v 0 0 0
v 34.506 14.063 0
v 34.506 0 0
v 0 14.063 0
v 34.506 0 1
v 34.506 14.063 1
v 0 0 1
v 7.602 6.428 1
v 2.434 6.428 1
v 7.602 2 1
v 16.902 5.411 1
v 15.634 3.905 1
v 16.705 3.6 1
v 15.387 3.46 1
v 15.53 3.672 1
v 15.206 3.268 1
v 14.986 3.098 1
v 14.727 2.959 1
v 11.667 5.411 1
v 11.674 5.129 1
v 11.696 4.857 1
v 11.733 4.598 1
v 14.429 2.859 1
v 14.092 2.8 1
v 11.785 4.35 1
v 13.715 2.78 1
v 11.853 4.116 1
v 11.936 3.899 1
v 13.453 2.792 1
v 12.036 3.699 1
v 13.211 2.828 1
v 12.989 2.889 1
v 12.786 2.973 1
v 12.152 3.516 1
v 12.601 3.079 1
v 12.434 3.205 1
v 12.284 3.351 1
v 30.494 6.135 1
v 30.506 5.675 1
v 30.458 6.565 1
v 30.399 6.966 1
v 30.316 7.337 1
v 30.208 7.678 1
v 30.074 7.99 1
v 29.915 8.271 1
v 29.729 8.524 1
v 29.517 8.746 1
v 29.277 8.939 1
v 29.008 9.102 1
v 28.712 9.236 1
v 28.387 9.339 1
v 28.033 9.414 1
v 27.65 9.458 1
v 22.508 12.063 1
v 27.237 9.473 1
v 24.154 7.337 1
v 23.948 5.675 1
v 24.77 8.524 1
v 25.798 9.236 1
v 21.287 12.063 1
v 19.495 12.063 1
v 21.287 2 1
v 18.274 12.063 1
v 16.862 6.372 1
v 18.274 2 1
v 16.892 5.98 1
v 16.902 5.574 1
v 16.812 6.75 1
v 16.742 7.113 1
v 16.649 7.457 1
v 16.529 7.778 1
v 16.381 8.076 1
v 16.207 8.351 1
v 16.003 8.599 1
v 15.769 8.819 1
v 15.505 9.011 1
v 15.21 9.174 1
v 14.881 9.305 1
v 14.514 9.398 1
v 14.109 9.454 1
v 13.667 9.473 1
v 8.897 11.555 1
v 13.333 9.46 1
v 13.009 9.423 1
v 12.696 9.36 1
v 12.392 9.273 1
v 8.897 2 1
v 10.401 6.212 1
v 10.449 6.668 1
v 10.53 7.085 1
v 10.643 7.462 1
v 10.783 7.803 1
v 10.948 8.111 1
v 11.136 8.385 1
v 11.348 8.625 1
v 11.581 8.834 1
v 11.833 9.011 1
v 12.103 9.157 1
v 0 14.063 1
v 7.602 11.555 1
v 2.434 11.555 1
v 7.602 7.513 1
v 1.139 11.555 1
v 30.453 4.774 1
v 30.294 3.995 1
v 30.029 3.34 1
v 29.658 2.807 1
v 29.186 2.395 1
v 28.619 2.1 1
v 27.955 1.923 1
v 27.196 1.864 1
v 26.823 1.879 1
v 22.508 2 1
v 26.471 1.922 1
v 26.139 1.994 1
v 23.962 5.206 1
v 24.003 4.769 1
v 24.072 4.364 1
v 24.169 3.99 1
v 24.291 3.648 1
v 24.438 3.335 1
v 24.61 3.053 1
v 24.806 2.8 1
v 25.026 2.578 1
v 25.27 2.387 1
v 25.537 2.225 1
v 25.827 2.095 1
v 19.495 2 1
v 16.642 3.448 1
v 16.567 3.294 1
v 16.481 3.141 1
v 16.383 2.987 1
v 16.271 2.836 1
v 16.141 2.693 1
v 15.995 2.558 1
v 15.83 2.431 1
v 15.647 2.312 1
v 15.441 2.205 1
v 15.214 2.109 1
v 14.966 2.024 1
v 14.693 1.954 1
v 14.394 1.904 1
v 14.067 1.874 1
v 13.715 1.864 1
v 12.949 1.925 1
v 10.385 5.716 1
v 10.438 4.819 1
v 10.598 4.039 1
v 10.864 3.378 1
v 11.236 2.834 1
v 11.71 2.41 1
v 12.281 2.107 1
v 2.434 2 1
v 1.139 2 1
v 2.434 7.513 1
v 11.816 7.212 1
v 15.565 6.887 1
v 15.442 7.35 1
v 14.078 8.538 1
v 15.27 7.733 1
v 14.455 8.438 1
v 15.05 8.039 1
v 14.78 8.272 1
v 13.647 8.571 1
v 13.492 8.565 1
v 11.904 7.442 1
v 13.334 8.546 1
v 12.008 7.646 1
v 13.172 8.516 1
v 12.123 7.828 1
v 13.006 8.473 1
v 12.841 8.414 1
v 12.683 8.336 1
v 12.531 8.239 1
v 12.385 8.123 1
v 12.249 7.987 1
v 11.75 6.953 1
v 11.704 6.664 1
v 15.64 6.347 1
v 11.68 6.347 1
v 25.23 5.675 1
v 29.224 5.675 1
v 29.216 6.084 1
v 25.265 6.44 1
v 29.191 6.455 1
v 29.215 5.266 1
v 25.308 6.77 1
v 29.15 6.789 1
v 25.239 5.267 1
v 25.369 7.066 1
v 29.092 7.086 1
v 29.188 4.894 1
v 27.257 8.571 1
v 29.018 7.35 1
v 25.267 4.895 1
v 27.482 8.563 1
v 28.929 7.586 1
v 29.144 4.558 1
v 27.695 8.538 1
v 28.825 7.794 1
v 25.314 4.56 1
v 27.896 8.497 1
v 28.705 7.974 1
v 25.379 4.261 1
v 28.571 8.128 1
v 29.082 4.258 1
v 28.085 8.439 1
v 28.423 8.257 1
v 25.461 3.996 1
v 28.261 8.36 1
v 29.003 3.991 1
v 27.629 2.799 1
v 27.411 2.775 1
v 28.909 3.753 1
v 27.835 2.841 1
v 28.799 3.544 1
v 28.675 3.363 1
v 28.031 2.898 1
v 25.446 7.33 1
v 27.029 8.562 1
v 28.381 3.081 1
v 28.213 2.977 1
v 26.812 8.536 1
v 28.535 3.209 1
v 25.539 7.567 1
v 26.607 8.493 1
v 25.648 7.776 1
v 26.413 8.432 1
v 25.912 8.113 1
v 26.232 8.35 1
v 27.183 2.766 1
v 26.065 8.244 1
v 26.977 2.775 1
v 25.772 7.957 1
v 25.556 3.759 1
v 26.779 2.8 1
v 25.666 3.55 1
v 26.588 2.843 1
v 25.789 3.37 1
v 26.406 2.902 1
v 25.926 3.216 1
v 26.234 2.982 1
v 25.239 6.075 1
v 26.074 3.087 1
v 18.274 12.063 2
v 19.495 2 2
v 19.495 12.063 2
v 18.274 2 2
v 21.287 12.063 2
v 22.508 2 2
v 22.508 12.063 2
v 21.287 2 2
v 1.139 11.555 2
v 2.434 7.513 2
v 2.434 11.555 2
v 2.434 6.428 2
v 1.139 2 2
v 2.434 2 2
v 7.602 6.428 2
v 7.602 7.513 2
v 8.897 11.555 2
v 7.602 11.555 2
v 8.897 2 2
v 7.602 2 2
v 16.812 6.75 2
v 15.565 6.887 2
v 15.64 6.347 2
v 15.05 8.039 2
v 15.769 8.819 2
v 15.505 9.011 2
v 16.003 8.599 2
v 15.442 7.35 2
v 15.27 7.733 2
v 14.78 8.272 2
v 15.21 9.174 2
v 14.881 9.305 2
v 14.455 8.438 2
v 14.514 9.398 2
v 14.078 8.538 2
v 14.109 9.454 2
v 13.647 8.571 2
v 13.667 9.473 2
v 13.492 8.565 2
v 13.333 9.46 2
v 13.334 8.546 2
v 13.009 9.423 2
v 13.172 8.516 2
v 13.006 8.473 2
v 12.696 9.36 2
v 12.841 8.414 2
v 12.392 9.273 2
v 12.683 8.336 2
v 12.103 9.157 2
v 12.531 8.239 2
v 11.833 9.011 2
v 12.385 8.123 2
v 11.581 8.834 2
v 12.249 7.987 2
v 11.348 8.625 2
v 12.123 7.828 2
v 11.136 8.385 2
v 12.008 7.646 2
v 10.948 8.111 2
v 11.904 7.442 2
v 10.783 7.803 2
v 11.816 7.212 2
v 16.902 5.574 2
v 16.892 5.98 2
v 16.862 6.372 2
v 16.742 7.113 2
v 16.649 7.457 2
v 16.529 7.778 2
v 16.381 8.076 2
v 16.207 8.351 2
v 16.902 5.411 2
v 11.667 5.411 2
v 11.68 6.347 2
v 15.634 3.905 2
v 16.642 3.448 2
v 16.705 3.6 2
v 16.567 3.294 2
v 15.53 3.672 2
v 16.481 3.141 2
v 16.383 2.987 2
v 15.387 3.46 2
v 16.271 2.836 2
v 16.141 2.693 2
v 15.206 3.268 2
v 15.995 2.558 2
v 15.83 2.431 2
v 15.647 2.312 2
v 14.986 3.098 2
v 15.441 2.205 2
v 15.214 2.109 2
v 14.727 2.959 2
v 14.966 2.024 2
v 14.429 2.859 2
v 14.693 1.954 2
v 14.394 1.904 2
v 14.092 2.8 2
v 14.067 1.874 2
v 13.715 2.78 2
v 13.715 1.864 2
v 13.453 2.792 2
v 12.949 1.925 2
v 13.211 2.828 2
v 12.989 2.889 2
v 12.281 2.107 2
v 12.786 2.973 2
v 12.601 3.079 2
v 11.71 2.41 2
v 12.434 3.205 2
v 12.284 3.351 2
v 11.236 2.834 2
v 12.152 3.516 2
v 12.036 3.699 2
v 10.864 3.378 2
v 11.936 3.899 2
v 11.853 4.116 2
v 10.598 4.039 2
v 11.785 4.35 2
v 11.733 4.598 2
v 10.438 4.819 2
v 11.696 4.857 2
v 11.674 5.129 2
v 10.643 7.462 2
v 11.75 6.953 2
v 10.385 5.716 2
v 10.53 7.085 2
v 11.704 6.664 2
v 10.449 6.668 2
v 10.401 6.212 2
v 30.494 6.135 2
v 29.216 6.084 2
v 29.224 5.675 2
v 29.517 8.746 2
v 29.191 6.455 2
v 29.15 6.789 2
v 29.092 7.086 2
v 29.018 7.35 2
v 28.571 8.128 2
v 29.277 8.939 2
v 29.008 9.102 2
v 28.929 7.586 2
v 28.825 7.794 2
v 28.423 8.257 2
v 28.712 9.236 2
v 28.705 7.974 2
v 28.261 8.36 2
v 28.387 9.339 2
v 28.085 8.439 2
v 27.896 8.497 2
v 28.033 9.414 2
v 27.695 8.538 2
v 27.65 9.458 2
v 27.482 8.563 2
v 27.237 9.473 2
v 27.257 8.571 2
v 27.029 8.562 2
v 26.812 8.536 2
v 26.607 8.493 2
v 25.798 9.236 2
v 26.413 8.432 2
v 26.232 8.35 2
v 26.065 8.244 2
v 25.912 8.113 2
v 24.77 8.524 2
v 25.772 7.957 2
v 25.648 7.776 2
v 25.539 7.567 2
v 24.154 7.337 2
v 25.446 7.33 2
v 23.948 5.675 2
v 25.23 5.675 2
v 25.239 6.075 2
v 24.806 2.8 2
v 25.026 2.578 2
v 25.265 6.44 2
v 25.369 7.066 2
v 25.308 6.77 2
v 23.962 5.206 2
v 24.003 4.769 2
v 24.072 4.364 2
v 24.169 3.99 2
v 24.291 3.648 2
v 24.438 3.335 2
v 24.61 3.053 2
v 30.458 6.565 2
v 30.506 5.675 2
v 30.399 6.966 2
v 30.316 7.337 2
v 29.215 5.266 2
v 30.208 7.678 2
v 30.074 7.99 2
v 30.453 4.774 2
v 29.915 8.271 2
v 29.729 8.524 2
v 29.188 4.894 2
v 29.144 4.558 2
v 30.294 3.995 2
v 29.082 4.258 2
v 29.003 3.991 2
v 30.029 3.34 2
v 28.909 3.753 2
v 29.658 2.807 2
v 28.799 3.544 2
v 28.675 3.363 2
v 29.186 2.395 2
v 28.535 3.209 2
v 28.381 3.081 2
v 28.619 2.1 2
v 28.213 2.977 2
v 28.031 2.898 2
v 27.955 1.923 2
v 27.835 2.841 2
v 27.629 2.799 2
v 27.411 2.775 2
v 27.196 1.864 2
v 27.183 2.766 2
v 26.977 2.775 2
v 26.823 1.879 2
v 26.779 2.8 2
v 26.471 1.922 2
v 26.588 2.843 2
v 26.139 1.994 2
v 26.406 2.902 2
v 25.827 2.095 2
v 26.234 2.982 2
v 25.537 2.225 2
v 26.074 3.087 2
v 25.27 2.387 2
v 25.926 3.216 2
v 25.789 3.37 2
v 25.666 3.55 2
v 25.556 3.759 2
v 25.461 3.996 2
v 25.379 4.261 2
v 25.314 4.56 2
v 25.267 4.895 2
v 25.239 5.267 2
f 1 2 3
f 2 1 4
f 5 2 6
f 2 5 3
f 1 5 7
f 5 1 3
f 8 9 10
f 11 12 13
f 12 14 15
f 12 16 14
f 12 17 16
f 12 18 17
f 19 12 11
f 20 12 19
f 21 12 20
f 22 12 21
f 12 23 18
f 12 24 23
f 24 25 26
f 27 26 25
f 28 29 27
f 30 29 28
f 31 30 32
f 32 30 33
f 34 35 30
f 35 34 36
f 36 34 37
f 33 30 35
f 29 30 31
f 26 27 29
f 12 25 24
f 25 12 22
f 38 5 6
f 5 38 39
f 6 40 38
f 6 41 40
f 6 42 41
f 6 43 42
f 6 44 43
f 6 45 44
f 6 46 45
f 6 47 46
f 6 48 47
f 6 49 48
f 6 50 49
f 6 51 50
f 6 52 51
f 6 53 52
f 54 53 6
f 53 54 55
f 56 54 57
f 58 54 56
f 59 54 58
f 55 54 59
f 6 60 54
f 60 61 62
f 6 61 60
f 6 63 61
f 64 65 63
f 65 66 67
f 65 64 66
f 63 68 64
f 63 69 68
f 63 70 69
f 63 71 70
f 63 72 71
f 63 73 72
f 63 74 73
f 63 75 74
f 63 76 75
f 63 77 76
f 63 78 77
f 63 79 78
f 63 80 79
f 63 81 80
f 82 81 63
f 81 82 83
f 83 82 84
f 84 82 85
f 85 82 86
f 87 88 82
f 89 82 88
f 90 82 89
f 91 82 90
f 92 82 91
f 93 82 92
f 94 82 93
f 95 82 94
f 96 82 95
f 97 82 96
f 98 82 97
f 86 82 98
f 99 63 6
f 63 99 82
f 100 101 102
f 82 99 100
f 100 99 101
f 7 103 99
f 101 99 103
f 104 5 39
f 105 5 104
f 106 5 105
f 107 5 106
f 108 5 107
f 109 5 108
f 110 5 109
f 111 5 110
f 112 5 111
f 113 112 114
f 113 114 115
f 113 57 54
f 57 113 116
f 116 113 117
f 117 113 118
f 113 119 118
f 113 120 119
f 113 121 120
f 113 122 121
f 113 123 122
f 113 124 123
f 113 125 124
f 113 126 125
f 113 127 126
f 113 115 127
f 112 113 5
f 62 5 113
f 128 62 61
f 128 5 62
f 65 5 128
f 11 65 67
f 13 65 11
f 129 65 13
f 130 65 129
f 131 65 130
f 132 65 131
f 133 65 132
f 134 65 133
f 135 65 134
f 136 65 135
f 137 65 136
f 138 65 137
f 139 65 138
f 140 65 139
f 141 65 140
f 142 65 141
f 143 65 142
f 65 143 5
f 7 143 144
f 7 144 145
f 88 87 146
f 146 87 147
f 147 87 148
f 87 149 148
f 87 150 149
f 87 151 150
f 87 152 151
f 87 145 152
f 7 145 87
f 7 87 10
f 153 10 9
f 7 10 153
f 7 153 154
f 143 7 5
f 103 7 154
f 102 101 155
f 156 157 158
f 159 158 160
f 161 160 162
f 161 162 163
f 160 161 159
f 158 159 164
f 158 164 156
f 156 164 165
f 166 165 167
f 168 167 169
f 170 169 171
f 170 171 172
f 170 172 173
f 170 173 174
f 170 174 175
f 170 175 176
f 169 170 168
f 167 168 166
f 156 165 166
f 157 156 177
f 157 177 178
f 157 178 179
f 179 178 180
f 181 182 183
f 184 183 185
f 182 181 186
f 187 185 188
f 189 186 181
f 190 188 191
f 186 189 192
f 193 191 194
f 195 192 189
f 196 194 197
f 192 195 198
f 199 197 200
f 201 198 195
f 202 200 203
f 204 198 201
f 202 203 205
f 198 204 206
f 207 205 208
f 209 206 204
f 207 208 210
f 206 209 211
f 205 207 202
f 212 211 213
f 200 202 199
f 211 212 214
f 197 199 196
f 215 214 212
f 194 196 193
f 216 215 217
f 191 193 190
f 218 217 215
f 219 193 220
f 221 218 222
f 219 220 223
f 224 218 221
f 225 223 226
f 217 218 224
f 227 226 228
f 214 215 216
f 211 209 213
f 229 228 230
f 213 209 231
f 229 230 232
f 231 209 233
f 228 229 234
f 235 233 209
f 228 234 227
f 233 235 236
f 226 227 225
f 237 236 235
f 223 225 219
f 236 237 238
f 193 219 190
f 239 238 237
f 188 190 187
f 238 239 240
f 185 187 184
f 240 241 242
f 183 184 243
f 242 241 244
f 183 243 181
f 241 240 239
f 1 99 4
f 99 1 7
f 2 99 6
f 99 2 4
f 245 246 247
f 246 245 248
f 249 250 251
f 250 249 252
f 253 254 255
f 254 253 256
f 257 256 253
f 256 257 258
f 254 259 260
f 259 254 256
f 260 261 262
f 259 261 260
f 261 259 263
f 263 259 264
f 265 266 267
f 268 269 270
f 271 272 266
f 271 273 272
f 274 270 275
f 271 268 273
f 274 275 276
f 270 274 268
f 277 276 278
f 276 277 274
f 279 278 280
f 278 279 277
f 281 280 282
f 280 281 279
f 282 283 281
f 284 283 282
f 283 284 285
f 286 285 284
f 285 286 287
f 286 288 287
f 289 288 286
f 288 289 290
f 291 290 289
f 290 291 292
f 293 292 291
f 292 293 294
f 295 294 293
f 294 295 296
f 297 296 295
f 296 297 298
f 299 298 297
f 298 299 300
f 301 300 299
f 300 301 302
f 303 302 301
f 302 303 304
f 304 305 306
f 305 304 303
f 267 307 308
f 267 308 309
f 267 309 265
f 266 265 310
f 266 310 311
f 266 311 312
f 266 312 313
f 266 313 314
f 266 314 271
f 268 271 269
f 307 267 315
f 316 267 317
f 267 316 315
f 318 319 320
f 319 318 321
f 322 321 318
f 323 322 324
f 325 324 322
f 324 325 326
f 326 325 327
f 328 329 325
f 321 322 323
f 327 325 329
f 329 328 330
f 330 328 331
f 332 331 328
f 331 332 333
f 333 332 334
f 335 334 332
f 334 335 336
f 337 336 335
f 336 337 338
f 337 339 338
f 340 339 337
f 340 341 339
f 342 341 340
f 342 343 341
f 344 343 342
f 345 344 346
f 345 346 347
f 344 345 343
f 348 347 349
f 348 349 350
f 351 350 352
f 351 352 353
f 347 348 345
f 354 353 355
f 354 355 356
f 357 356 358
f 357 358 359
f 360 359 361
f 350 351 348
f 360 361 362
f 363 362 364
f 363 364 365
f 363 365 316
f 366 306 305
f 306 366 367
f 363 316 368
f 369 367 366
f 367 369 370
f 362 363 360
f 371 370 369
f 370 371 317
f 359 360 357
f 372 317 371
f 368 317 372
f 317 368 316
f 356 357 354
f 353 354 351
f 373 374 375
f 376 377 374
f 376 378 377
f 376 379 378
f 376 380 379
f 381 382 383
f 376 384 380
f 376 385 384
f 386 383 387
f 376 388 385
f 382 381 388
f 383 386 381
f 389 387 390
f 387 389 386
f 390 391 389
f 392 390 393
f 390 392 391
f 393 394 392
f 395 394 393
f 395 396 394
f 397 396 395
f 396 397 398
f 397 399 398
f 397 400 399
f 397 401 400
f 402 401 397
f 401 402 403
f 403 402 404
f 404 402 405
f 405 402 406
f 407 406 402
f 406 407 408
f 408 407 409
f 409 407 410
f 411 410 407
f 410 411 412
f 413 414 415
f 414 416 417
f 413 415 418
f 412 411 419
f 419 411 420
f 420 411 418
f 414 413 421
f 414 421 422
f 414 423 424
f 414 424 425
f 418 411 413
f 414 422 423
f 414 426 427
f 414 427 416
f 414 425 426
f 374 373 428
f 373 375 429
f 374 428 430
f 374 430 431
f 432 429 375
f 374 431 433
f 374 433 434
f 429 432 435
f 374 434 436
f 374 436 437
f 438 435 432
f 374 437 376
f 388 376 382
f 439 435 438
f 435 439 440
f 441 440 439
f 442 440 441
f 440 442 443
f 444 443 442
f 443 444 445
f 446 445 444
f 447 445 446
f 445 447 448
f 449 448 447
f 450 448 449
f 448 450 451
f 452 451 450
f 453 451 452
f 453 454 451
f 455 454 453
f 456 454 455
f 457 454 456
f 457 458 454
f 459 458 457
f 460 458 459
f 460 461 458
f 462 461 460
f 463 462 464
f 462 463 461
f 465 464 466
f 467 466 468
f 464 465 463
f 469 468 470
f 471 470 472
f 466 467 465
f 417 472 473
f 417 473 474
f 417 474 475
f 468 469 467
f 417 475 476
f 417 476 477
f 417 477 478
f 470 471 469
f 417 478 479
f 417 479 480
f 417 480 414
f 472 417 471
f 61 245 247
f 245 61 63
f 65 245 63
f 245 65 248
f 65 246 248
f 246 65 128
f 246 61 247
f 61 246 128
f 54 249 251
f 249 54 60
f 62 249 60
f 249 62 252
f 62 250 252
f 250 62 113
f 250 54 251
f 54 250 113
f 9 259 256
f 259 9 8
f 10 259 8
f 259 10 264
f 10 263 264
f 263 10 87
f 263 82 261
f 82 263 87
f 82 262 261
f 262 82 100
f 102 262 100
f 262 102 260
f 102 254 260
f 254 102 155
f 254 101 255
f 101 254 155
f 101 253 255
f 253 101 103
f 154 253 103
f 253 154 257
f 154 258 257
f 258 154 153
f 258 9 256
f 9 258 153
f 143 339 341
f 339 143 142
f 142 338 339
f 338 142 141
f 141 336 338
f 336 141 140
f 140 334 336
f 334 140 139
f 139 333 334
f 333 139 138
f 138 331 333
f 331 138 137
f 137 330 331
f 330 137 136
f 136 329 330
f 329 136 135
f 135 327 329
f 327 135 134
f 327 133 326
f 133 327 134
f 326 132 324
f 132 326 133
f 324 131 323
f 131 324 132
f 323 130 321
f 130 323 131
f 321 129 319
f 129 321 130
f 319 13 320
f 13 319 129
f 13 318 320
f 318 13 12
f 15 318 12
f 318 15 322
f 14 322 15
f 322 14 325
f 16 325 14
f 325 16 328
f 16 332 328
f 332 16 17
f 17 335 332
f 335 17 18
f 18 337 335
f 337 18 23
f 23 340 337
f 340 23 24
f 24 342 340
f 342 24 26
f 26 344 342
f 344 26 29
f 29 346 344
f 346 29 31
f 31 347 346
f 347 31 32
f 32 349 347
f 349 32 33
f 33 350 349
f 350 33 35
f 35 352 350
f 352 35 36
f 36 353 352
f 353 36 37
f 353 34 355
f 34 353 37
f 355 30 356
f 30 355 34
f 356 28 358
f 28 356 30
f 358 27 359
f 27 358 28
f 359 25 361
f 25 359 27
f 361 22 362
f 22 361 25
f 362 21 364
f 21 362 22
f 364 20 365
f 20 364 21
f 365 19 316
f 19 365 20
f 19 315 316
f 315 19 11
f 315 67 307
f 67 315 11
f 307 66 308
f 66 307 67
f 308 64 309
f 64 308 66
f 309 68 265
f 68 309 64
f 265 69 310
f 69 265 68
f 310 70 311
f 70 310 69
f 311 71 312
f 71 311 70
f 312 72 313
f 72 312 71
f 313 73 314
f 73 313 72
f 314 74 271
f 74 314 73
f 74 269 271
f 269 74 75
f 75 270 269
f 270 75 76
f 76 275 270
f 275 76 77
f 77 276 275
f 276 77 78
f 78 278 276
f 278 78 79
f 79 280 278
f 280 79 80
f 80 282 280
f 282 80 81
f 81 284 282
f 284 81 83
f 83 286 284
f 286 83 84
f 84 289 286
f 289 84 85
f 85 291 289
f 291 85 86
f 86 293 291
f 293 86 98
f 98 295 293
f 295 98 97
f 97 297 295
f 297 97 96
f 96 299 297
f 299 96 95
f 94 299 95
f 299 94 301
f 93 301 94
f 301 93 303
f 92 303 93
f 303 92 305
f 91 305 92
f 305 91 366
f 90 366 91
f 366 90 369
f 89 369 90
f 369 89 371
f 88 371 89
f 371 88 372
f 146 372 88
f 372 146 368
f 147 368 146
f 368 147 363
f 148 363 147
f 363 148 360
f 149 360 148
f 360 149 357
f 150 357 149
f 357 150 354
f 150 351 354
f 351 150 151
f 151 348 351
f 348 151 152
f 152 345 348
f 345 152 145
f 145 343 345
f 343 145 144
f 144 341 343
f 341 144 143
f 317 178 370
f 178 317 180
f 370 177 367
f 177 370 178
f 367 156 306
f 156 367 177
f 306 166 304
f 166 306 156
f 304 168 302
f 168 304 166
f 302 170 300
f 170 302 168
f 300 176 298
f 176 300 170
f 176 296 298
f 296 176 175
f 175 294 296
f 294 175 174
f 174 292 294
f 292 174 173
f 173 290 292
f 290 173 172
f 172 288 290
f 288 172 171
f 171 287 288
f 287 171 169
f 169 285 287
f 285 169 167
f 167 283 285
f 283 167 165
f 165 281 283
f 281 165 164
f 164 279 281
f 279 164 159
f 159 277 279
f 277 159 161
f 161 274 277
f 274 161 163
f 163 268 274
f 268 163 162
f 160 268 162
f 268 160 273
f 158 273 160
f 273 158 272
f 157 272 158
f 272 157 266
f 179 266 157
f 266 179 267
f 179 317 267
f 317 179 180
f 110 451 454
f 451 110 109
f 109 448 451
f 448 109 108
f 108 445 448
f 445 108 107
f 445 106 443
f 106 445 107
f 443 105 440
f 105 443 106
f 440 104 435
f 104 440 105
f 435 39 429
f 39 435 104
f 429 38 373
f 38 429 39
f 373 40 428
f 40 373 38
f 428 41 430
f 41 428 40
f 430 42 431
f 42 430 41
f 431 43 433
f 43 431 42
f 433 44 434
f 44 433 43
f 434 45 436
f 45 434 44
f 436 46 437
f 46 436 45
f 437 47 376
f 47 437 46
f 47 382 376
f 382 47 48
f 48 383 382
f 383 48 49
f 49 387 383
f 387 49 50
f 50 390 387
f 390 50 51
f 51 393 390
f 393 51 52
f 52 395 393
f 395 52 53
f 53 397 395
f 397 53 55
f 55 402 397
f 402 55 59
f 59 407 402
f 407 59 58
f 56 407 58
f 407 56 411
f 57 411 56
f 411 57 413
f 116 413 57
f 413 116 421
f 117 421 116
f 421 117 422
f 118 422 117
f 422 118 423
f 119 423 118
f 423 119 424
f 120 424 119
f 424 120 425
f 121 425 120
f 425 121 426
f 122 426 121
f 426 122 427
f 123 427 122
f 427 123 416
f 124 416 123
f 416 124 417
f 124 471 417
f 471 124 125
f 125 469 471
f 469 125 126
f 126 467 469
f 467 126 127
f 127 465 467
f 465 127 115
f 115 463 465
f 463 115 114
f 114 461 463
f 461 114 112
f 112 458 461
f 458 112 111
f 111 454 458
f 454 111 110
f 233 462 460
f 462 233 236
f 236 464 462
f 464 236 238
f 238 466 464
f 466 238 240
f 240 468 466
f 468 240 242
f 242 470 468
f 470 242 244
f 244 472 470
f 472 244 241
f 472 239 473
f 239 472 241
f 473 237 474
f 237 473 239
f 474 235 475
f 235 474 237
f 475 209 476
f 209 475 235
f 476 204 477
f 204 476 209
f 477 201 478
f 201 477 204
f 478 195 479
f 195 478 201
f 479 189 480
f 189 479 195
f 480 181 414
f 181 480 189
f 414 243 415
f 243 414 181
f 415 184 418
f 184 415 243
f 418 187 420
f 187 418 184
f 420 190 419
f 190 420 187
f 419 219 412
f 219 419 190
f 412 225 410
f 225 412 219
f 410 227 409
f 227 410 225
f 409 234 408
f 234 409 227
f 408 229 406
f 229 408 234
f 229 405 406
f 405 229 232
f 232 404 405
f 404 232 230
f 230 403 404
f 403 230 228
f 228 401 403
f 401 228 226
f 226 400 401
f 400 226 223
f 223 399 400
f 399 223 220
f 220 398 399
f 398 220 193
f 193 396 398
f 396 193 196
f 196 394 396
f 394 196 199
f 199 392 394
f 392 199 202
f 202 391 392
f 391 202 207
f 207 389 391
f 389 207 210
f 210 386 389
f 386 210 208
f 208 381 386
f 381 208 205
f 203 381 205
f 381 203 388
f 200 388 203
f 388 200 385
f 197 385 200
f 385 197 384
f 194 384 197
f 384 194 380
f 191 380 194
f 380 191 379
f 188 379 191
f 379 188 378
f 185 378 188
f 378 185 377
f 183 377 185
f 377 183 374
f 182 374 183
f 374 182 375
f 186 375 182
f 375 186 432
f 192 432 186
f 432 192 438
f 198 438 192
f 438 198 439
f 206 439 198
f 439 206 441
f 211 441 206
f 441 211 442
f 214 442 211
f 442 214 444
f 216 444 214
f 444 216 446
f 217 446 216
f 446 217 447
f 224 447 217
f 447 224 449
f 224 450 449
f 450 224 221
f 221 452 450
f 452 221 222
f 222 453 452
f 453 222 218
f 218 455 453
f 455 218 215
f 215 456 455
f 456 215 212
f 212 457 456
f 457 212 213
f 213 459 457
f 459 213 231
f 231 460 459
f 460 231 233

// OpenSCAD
// LibFile: unfy_lists.scad
//   UnfyOpenSCADLib Copyright Leif Burrow 2026
//   kc8rwr@unfy.us
//   unforgettability.net
//   .
//   This file is part of UnfyOpenSCADLib.
//   .
//   unfy_lists.scad contains functions for working with lists and strings within OpenSCAD.

part = "Demo"; //["Demo", "None"]

// Function: unf_lookup
// Synopsis: Lookup with interpolation
// Description: (key, vector[key, value]) - Looks up a value from a table, like the built-in lookup function but interpolate even beyond the bounds of the vector
// Usage: lookup(key, values)
// Arguments:
//   key = the lookup key
//   values = the value table to look within
function unf_lookup(key, values) = 0 == len(values) ? undef : (
  1 == len(values) ? values[0][1] : (
    key < values[0][0] ? values[0][1]-(((values[1][1]-values[0][1])/(values[1][0]-values[0][0])*(values[0][0]-key))) : (
      key <= values[len(values)-1][0] ? lookup(key, values) : (
	values[len(values)-1][1]+((((values[len(values)-1][0]-values[len(values)-2][0])/(values[len(values)-1][1]-values[len(values)-2][1]))*(key-values[len(values)-1][0])))
      )
    )
  )
);

// Function: unf_stCutAfter
// Synopsis: Return a string with everything after the beginning of the first occurance of a substring cut off.
// Description: Find the first occurrance of cutoff within in and return a string that consists of in, only up to that point with the rest cut off.
// Usage: unf_stCutAfter(string in, string cutoff)
// Arguments:
//   in = the input string
//   cutoff = the search substring
//   trim = also trim any preceding or trailing whitespace?
function unf_stCutAfter(in, cutoff, trim=true) = trim ? unf_stTrim(unf_stCutAfter(in, cutoff, false)) : (
  let(vpos=search(cutoff, in), pos=(0==len(vpos)?-1:vpos.x)) 0 > pos ? in : unf_sub(in, 0, pos)
);

// Function: unf_stTrim
// Synopsis: Trim a string
// Description: Return a copy of a string with any whitespace on the front or back trimmed off.
// Usage: unf_strTrim(in)
// Arguments:
//   in = the input string
function unf_stTrim(in) = let(last=len(in)-1)
  0>last ? "" : (
    " "==in[0] || "\r"==in[0] || "\n"==in[0] ? unf_stTrim(unf_sub(in, 1)) : (
      " "==in[last] || "\r"==in[last] || "\n"==in[last] ? unf_stTrim(unf_sub(in, 0, last)) : in
    )
  );

// Function: unf_vToS
// Synopsis: Convert a vector to a string
// Description: Convert a vector to a string.
// Usage: unf_vToS(in)
// Arguments:
//   in = input vector
function unf_vToS(in, pref="", start=0) =
  start >= len(in) ? pref : unf_vToS(in, str(in=pref, pref=in[start]), start=start+1);

// Function: unf_stToLower
// Synopsis: Convert a string to lowercase.
// Description: Take an input string and return a copy where every uppercase character has been converted to it's lowercase equivalent.
// Usage: unf_stToLower(in)
// Arguments:
//   in = the input string
function unf_stToLower(in, pref="", start=0) =
  start >= len(in) ? pref : unf_stToLower(in, str(in=pref, pref=unf_chToLower(in[start])), start=start+1);
  
// Function: unf_stToUpper
// Synopsis: Convert a string to uppercase.
// Description: Take an input string and return a copy where every lowercase character has been converted to it's uppercase equivalent.
// Usage: unf_stToUpper(in)
// Arguments:
//   in = the input string
function unf_stToUpper(in, pref="", start=0) =
  start >= len(in) ? pref : unf_stToUpper(in, str(in=pref, pref=unf_chToUpper(in[start])), start=start+1);

// Function: unf_chToLower
// Synopsis: Convert a character to lowercase
// Description: Accepts a single character and if it is uppercase then return it's lowercase equivalent otherwise return the original input.
// Usage: unf_chToLower(in)
// Arguments:
//   in = the input character
function unf_chToLower(in) = chr(unf_ordToLower(ord(in)));

// Function: unf_chToUpper
// Synopsis: Convert a character to uppercase
// Description: Accepts a single character and if it is lowercase then return it's uppercase equivalent otherwise return the original input.
// Usage: unf_chToUpper(in)
// Arguments:
//   in = the input character
function unf_chToUpper(in) = chr(unf_ordToUpper(ord(in)));

// Function: unf_sub
// Synopsis: return a subset of a string or a vector
// Usage:
//   unf_sub(v, start, count, outv)
// Description:
//   Takes a string or vector input. Returns a string or vector starting at an index and ending no more than count beyond this index. Returns a string or vector type output the same as the input unless outv is set true. In that case then always output a vector.
// Arguments:
//   v = input string or vector value
//   start = starting index
//   count = count of max caracters or items to return
//   outv = force output type to vector?
function unf_sub(v, start=0, count=0, outv=false) =
  (!outv) && is_string(v) ? unf_vToS(unf_sub(v, start, count, true)) : (
    0 == count ? [for(i=[start:len(v)-1])v[i]] : (
      0 < count ? [for(i = [start : min(len(v)-1, start+count-1)]) v[i]] : (
	[for(i = [max(0, start+count+1) : start]) v[i]]
      )
    )
  );

// Function: unf_stToInt
// Synopsis: convert a numeric string to an integer
// Description:
//   Converts a numeric string to an integer. Garbage in = Garbage Out. Non-numeric characters are counted as 0s. Uses recursion, not tail recursive so could overflow but.. that would require a very long number string.
// Usage:
//   unf_stToInt(in)
// Arguments: in = input string
function unf_stToInt(in) = "" == in ? 0 : (
  1 == len(in) ? (
    "0" > in[0] || "9" < in[0] ? 0 : ord(in[0]) - ord("0")
  ) : (
    unf_stToInt(in[len(in)-1]) + (10 * unf_stToInt(unf_sub(in, 0, len(in)-1)))
  )
);

// Function: unf_stToDec
// Synopsis: convert a numeric string to an number's decimal part
// Description:
//   Converts a numeric string to an integer less than 1. Convert it as though there was a "0." in front of it. For example, "123" becomes the number 0.123.  Garbage in = Garbage Out. Non-numeric characters are counted as 0s. Uses recursion, not tail recursive so could overflow but.. that would require a very long number string.
// Usage:
//   unf_stToDec(in)
// Arguments: in = input string
function unf_stToDec(in) = "" == in ? 0 : (
  1 == len(in) ? (
    "0" > in[0] || "9" < in[0] ? 0 : (ord(in[0]) - ord("0")) / 10
  ) : (
    unf_stToDec(in[0]) + (unf_stToDec(unf_sub(in, 1))/10)
  )
);

// Function: unf_stToNum
// Synopsis: convert a numeric string to a number
// Description:
//   Converts a numeric string to a number. Handles integers and floats with decimal points. Interprets a '/' as division, converting fractions to decimals. Garbage in = Garbage Out. Non-numeric characters are counted as 0s. Uses recursion, not tail recursive so could overflow but.. that would require a very long number string.
// Usage:
//   unf_stToNum(in)
// Arguments: in = input string
function unf_stToNum(in) = "" == in ? 0 : (
  is_undef(search("/", in).x) ? (
    is_undef(search(".", in).x) ? unf_stToInt(in) : (
      ("." == in[0] ? 0 : unf_stToInt(unf_sub(in, 0, search(".", in).x)))
      +
      ("." == in[(len(in)-1)] ? 0 : unf_stToDec(unf_sub(in, search(".", in).x+1)))
    )
  ) : (
      ("/" == in[0] ? 0 : unf_stToNum(unf_sub(in, 0, search("/", in).x)))
      /
      ("/" == in[(len(in)-1)] ? 1 : unf_stToNum(unf_sub(in, search("/", in).x+1)))
  )
);

// Function: unf_ordToLower
// Synopsis: Convert a character represented as a unicode number to lowercase
// Description: Converts a number representing a unicode character to the number representing it's lowercase version
// Usage: unf_ordToLower(in)
// Arguments:
//   in = the input number
function unf_ordToLower(in) = in < 65 ? in : (in < 91 ? in+32 : (in < 192 ? in : (in < 215 ? in+32 : (in < 216 ? in : (in < 223 ? in+32 : (in < 256 ? in : (in < 304 ? in : (in < 305 ? in-199 : (in < 306 ? in : (in < 313 ? in : (in < 330 ? in : (in < 376 ? in : (in < 377 ? in-121 : (in < 378 ? (0 == ((in-377)%2) ? in+1 : in) : (in < 385 ? in : (in < 386 ? in+210 : (in < 387 ? (0 == ((in-386)%2) ? in+1 : in) : (in < 390 ? in : (in < 391 ? in+206 : (in < 392 ? (0 == ((in-391)%2) ? in+1 : in) : (in < 393 ? in : (in < 395 ? in+205 : (in < 396 ? (0 == ((in-395)%2) ? in+1 : in) : (in < 398 ? in : (in < 399 ? in+79 : (in < 400 ? in+202 : (in < 401 ? in+203 : (in < 402 ? (0 == ((in-401)%2) ? in+1 : in) : (in < 403 ? in : (in < 404 ? in+205 : (in < 405 ? in+207 : (in < 406 ? in : (in < 407 ? in+211 : (in < 408 ? in+209 : (in < 409 ? (0 == ((in-408)%2) ? in+1 : in) : (in < 412 ? in : (in < 413 ? in+211 : (in < 414 ? in+213 : (in < 415 ? in : (in < 416 ? in+214 : (in < 417 ? (0 == ((in-416)%2) ? in+1 : in) : (in < 422 ? in : (in < 423 ? in+218 : (in < 424 ? (0 == ((in-423)%2) ? in+1 : in) : (in < 425 ? in : (in < 426 ? in+218 : (in < 428 ? in : (in < 430 ? in : (in < 431 ? in+218 : (in < 432 ? (0 == ((in-431)%2) ? in+1 : in) : (in < 433 ? in : (in < 435 ? in+217 : (in < 436 ? (0 == ((in-435)%2) ? in+1 : in) : (in < 439 ? in : (in < 440 ? in+219 : (in < 441 ? (0 == ((in-440)%2) ? in+1 : in) : (in < 444 ? in : (in < 452 ? in : (in < 453 ? in+2 : (in < 454 ? (0 == ((in-453)%2) ? in+1 : in) : (in < 455 ? in : (in < 456 ? in+2 : (in < 457 ? (0 == ((in-456)%2) ? in+1 : in) : (in < 458 ? in : (in < 459 ? in+2 : (in < 460 ? (0 == ((in-459)%2) ? in+1 : in) : (in < 478 ? in : (in < 497 ? in : (in < 498 ? in+2 : (in < 499 ? (0 == ((in-498)%2) ? in+1 : in) : (in < 502 ? in : (in < 503 ? in-97 : (in < 504 ? in-56 : (in < 505 ? (0 == ((in-504)%2) ? in+1 : in) : (in < 544 ? in : (in < 545 ? in-130 : (in < 546 ? in : (in < 570 ? in : (in < 571 ? in+10795 : (in < 572 ? (0 == ((in-571)%2) ? in+1 : in) : (in < 573 ? in : (in < 574 ? in-163 : (in < 575 ? in+10792 : (in < 577 ? in : (in < 579 ? in : (in < 580 ? in-195 : (in < 581 ? in+69 : (in < 582 ? in+71 : (in < 583 ? (0 == ((in-582)%2) ? in+1 : in) : (in < 880 ? in : (in < 886 ? in : (in < 895 ? in : (in < 896 ? in+116 : (in < 902 ? in : (in < 903 ? in+38 : (in < 904 ? in : (in < 907 ? in+37 : (in < 908 ? in : (in < 909 ? in+64 : (in < 910 ? in : (in < 912 ? in+63 : (in < 913 ? in : (in < 930 ? in+32 : (in < 931 ? in : (in < 940 ? in+32 : (in < 975 ? in : (in < 976 ? in+8 : (in < 984 ? in : (in < 1012 ? in : (in < 1013 ? in-60 : (in < 1015 ? in : (in < 1017 ? in : (in < 1018 ? in-7 : (in < 1019 ? (0 == ((in-1018)%2) ? in+1 : in) : (in < 1021 ? in : (in < 1024 ? in-130 : (in < 1040 ? in+80 : (in < 1072 ? in+32 : (in < 1120 ? in : (in < 1162 ? in : (in < 1216 ? in : (in < 1217 ? in+15 : (in < 1218 ? (0 == ((in-1217)%2) ? in+1 : in) : (in < 1232 ? in : (in < 1329 ? in : (in < 1367 ? in+48 : (in < 4256 ? in : (in < 4294 ? in+7264 : (in < 4295 ? in : (in < 4296 ? in+7264 : (in < 4301 ? in : (in < 4302 ? in+7264 : (in < 5024 ? in : (in < 5104 ? in+38864 : (in < 5110 ? in+8 : (in < 7312 ? in : (in < 7355 ? in-3008 : (in < 7357 ? in : (in < 7360 ? in-3008 : (in < 7680 ? in : (in < 7838 ? in : (in < 7839 ? in-7615 : (in < 7840 ? in : (in < 7944 ? in : (in < 7952 ? in-8 : (in < 7960 ? in : (in < 7966 ? in-8 : (in < 7976 ? in : (in < 7984 ? in-8 : (in < 7992 ? in : (in < 8000 ? in-8 : (in < 8008 ? in : (in < 8014 ? in-8 : (in < 8025 ? in : (in < 8026 ? in-8 : (in < 8027 ? in : (in < 8028 ? in-8 : (in < 8029 ? in : (in < 8030 ? in-8 : (in < 8031 ? in : (in < 8032 ? in-8 : (in < 8040 ? in : (in < 8048 ? in-8 : (in < 8072 ? in : (in < 8080 ? in-8 : (in < 8088 ? in : (in < 8096 ? in-8 : (in < 8104 ? in : (in < 8112 ? in-8 : (in < 8120 ? in : (in < 8122 ? in-8 : (in < 8124 ? in-74 : (in < 8125 ? in-9 : (in < 8136 ? in : (in < 8140 ? in-86 : (in < 8141 ? in-9 : (in < 8152 ? in : (in < 8154 ? in-8 : (in < 8156 ? in-100 : (in < 8168 ? in : (in < 8170 ? in-8 : (in < 8172 ? in-112 : (in < 8173 ? in-7 : (in < 8184 ? in : (in < 8186 ? in-128 : (in < 8188 ? in-126 : (in < 8189 ? in-9 : (in < 8486 ? in : (in < 8487 ? in-7517 : (in < 8490 ? in : (in < 8491 ? in-8383 : (in < 8492 ? in-8262 : (in < 8498 ? in : (in < 8499 ? in+28 : (in < 8544 ? in : (in < 8560 ? in+16 : (in < 8579 ? in : (in < 9398 ? in : (in < 9424 ? in+26 : (in < 11264 ? in : (in < 11311 ? in+48 : (in < 11360 ? in : (in < 11362 ? in : (in < 11363 ? in-10743 : (in < 11364 ? in-3814 : (in < 11365 ? in-10727 : (in < 11367 ? in : (in < 11373 ? in : (in < 11374 ? in-10780 : (in < 11375 ? in-10749 : (in < 11376 ? in-10783 : (in < 11377 ? in-10782 : (in < 11378 ? in : (in < 11381 ? in : (in < 11390 ? in : (in < 11392 ? in-10815 : (in < 11393 ? (0 == ((in-11392)%2) ? in+1 : in) : (in < 11499 ? in : (in < 11506 ? in : (in < 42560 ? in : (in < 42624 ? in : (in < 42786 ? in : (in < 42802 ? in : (in < 42873 ? in : (in < 42877 ? in : (in < 42878 ? in-35332 : (in < 42879 ? (0 == ((in-42878)%2) ? in+1 : in) : (in < 42891 ? in : (in < 42893 ? in : (in < 42894 ? in-42280 : (in < 42896 ? in : (in < 42902 ? in : (in < 42922 ? in : (in < 42923 ? in-42308 : (in < 42924 ? in-42319 : (in < 42925 ? in-42315 : (in < 42926 ? in-42305 : (in < 42927 ? in-42308 : (in < 42928 ? in : (in < 42929 ? in-42258 : (in < 42930 ? in-42282 : (in < 42931 ? in-42261 : (in < 42932 ? in+928 : (in < 42933 ? (0 == ((in-42932)%2) ? in+1 : in) : (in < 42946 ? in : (in < 42948 ? in : (in < 42949 ? in-48 : (in < 42950 ? in-42307 : (in < 42951 ? in-35384 : (in < 42952 ? (0 == ((in-42951)%2) ? in+1 : in) : (in < 42997 ? in : (in < 65313 ? in : (in < 65339 ? in+32 : (in < 66560 ? in : (in < 66600 ? in+40 : (in < 66736 ? in : (in < 66772 ? in+40 : (in < 68736 ? in : (in < 68787 ? in+64 : (in < 71840 ? in : (in < 71872 ? in+32 : (in < 93760 ? in : (in < 93792 ? in+32 : (in < 125184 ? in : (in < 125218 ? in+34 : (in))))))))))))))))))))))))))))))))))))))))))))))))))))))))))))))))))))))))))))))))))))))))))))))))))))))))))))))))))))))))))))))))))))))))))))))))))))))))))))))))))))))))))))))))))))))))))))))))))))))))))))))))))))))))))))))))))))))))))))))))))))))))))))))))))))))))));

// Function: unf_ordToUpper
// Synopsis: Convert a character represented as a unicode number to uppercase
// Description: Converts a number representing a unicode character to the number representing it's uppercase version
// Usage: unf_ordToLower(in)
// Arguments:
//   in = the input number
function unf_ordToUpper(in) = in < 97 ? in : (in < 123 ? in-32 : (in < 181 ? in : (in < 182 ? in+743 : (in < 223 ? in : (in < 224 ? in-140 : (in < 247 ? in-32 : (in < 248 ? in : (in < 255 ? in-32 : (in < 256 ? in+121 : (in < 257 ? in : (in < 305 ? in : (in < 306 ? in-232 : (in < 307 ? in : (in < 314 ? in : (in < 329 ? (0 == ((in-314)%2) ? in-1 : in) : (in < 330 ? in+371 : (in < 331 ? in : (in < 378 ? in : (in < 383 ? (0 == ((in-378)%2) ? in-1 : in) : (in < 384 ? in-300 : (in < 385 ? in+195 : (in < 387 ? in : (in < 392 ? in : (in < 396 ? in : (in < 402 ? in : (in < 405 ? in : (in < 406 ? in+97 : (in < 409 ? in : (in < 410 ? (0 == ((in-409)%2) ? in-1 : in) : (in < 411 ? in+163 : (in < 414 ? in : (in < 415 ? in+130 : (in < 417 ? in : (in < 424 ? in : (in < 429 ? in : (in < 432 ? in : (in < 436 ? in : (in < 441 ? in : (in < 445 ? in : (in < 447 ? in : (in < 448 ? in+56 : (in < 453 ? in : (in < 454 ? (0 == ((in-453)%2) ? in-1 : in) : (in < 455 ? in-2 : (in < 456 ? in : (in < 457 ? (0 == ((in-456)%2) ? in-1 : in) : (in < 458 ? in-2 : (in < 459 ? in : (in < 460 ? (0 == ((in-459)%2) ? in-1 : in) : (in < 461 ? in-2 : (in < 462 ? in : (in < 477 ? (0 == ((in-462)%2) ? in-1 : in) : (in < 478 ? in-79 : (in < 479 ? in : (in < 496 ? (0 == ((in-479)%2) ? in-1 : in) : (in < 497 ? in-422 : (in < 498 ? in : (in < 499 ? (0 == ((in-498)%2) ? in-1 : in) : (in < 500 ? in-2 : (in < 501 ? in : (in < 505 ? in : (in < 547 ? in : (in < 572 ? in : (in < 575 ? in : (in < 577 ? in+10815 : (in < 578 ? in : (in < 583 ? in : (in < 592 ? (0 == ((in-583)%2) ? in-1 : in) : (in < 593 ? in+10783 : (in < 594 ? in+10780 : (in < 595 ? in+10782 : (in < 596 ? in-210 : (in < 597 ? in-206 : (in < 598 ? in : (in < 600 ? in-205 : (in < 601 ? in : (in < 602 ? in-202 : (in < 603 ? in : (in < 604 ? in-203 : (in < 605 ? in+42319 : (in < 608 ? in : (in < 609 ? in-205 : (in < 610 ? in+42315 : (in < 611 ? in : (in < 612 ? in-207 : (in < 613 ? in : (in < 614 ? in+42280 : (in < 615 ? in+42308 : (in < 616 ? in : (in < 617 ? in-209 : (in < 618 ? in-211 : (in < 619 ? in+42308 : (in < 620 ? in+10743 : (in < 621 ? in+42305 : (in < 623 ? in : (in < 624 ? in-211 : (in < 625 ? in : (in < 626 ? in+10749 : (in < 627 ? in-213 : (in < 629 ? in : (in < 630 ? in-214 : (in < 637 ? in : (in < 638 ? in+10727 : (in < 640 ? in : (in < 641 ? in-218 : (in < 642 ? in : (in < 643 ? in+42307 : (in < 644 ? in-218 : (in < 647 ? in : (in < 648 ? in+42282 : (in < 649 ? in-218 : (in < 650 ? in-69 : (in < 652 ? in-217 : (in < 653 ? in-71 : (in < 658 ? in : (in < 659 ? in-219 : (in < 669 ? in : (in < 670 ? in+42261 : (in < 671 ? in+42258 : (in < 837 ? in : (in < 838 ? in+84 : (in < 881 ? in : (in < 887 ? in : (in < 891 ? in : (in < 894 ? in+130 : (in < 912 ? in : (in < 913 ? in+9 : (in < 940 ? in : (in < 941 ? in-38 : (in < 944 ? in-37 : (in < 945 ? in-11 : (in < 962 ? in-32 : (in < 963 ? in-31 : (in < 972 ? in-32 : (in < 973 ? in-64 : (in < 975 ? in-63 : (in < 976 ? in : (in < 977 ? in-62 : (in < 978 ? in-57 : (in < 981 ? in : (in < 982 ? in-47 : (in < 983 ? in-54 : (in < 984 ? in-8 : (in < 985 ? in : (in < 1008 ? (0 == ((in-985)%2) ? in-1 : in) : (in < 1009 ? in-86 : (in < 1010 ? in-80 : (in < 1011 ? in+7 : (in < 1012 ? in-116 : (in < 1013 ? in : (in < 1014 ? in-96 : (in < 1016 ? in : (in < 1019 ? in : (in < 1072 ? in : (in < 1104 ? in-32 : (in < 1120 ? in-80 : (in < 1121 ? in : (in < 1163 ? in : (in < 1218 ? in : (in < 1231 ? (0 == ((in-1218)%2) ? in-1 : in) : (in < 1232 ? in-15 : (in < 1233 ? in : (in < 1377 ? in : (in < 1415 ? in-48 : (in < 1416 ? in-82 : (in < 4304 ? in : (in < 4347 ? in+3008 : (in < 4349 ? in : (in < 4352 ? in+3008 : (in < 5112 ? in : (in < 5118 ? in-8 : (in < 7296 ? in : (in < 7297 ? in-6254 : (in < 7298 ? in-6253 : (in < 7299 ? in-6244 : (in < 7301 ? in-6242 : (in < 7302 ? in-6243 : (in < 7303 ? in-6236 : (in < 7304 ? in-6181 : (in < 7305 ? in+35266 : (in < 7545 ? in : (in < 7546 ? in+35332 : (in < 7549 ? in : (in < 7550 ? in+3814 : (in < 7566 ? in : (in < 7567 ? in+35384 : (in < 7681 ? in : (in < 7830 ? (0 == ((in-7681)%2) ? in-1 : in) : (in < 7831 ? in-7758 : (in < 7832 ? in-7747 : (in < 7833 ? in-7745 : (in < 7834 ? in-7744 : (in < 7835 ? in-7769 : (in < 7836 ? in-59 : (in < 7841 ? in : (in < 7936 ? (0 == ((in-7841)%2) ? in-1 : in) : (in < 7944 ? in+8 : (in < 7952 ? in : (in < 7958 ? in+8 : (in < 7968 ? in : (in < 7976 ? in+8 : (in < 7984 ? in : (in < 7992 ? in+8 : (in < 8000 ? in : (in < 8006 ? in+8 : (in < 8016 ? in : (in < 8017 ? in-7083 : (in < 8018 ? in+8 : (in < 8019 ? in-7085 : (in < 8020 ? in+8 : (in < 8021 ? in-7087 : (in < 8022 ? in+8 : (in < 8023 ? in-7089 : (in < 8024 ? in+8 : (in < 8032 ? in : (in < 8040 ? in+8 : (in < 8048 ? in : (in < 8050 ? in+74 : (in < 8054 ? in+86 : (in < 8056 ? in+100 : (in < 8058 ? in+128 : (in < 8060 ? in+112 : (in < 8062 ? in+126 : (in < 8064 ? in : (in < 8072 ? in-120 : (in < 8080 ? in-128 : (in < 8088 ? in-104 : (in < 8096 ? in-112 : (in < 8104 ? in-56 : (in < 8112 ? in-64 : (in < 8115 ? in+8 : (in < 8116 ? in-7202 : (in < 8117 ? in-7214 : (in < 8118 ? in : (in < 8119 ? in-7205 : (in < 8120 ? in-7206 : (in < 8124 ? in : (in < 8125 ? in-7211 : (in < 8126 ? in : (in < 8127 ? in-7205 : (in < 8130 ? in : (in < 8131 ? in+8 : (in < 8132 ? in-7212 : (in < 8133 ? in-7227 : (in < 8134 ? in : (in < 8135 ? in-7215 : (in < 8136 ? in-7216 : (in < 8140 ? in : (in < 8141 ? in-7221 : (in < 8144 ? in : (in < 8146 ? in+8 : (in < 8147 ? in-7225 : (in < 8148 ? in-7226 : (in < 8150 ? in : (in < 8151 ? in-7229 : (in < 8152 ? in-7230 : (in < 8160 ? in : (in < 8162 ? in+8 : (in < 8163 ? in-7229 : (in < 8164 ? in-7230 : (in < 8165 ? in-7235 : (in < 8166 ? in+7 : (in < 8167 ? in-7233 : (in < 8168 ? in-7234 : (in < 8178 ? in : (in < 8179 ? in+8 : (in < 8180 ? in-7242 : (in < 8181 ? in-7269 : (in < 8182 ? in : (in < 8183 ? in-7245 : (in < 8184 ? in-7246 : (in < 8188 ? in : (in < 8189 ? in-7251 : (in < 8526 ? in : (in < 8527 ? in-28 : (in < 8560 ? in : (in < 8576 ? in-16 : (in < 8580 ? in : (in < 9424 ? in : (in < 9450 ? in-26 : (in < 11312 ? in : (in < 11359 ? in-48 : (in < 11361 ? in : (in < 11365 ? in : (in < 11366 ? in-10795 : (in < 11367 ? in-10792 : (in < 11368 ? in : (in < 11379 ? in : (in < 11382 ? in : (in < 11393 ? in : (in < 11500 ? in : (in < 11507 ? in : (in < 11520 ? in : (in < 11558 ? in-7264 : (in < 11559 ? in : (in < 11560 ? in-7264 : (in < 11565 ? in : (in < 11566 ? in-7264 : (in < 42561 ? in : (in < 42625 ? in : (in < 42787 ? in : (in < 42803 ? in : (in < 42874 ? in : (in < 42879 ? in : (in < 42892 ? in : (in < 42897 ? in : (in < 42900 ? (0 == ((in-42897)%2) ? in-1 : in) : (in < 42901 ? in+48 : (in < 42903 ? in : (in < 42933 ? in : (in < 42947 ? in : (in < 42952 ? in : (in < 42998 ? in : (in < 43859 ? in : (in < 43860 ? in-928 : (in < 43888 ? in : (in < 43968 ? in-38864 : (in < 64256 ? in : (in < 64257 ? in-64186 : (in < 64258 ? in-64187 : (in < 64259 ? in-64188 : (in < 64260 ? in-64189 : (in < 64261 ? in-64190 : (in < 64262 ? in-64178 : (in < 64263 ? in-64179 : (in < 64275 ? in : (in < 64276 ? in-62927 : (in < 64277 ? in-62928 : (in < 64278 ? in-62929 : (in < 64279 ? in-62920 : (in < 64280 ? in-62931 : (in < 65345 ? in : (in < 65371 ? in-32 : (in < 66600 ? in : (in < 66640 ? in-40 : (in < 66776 ? in : (in < 66812 ? in-40 : (in < 68800 ? in : (in < 68851 ? in-64 : (in < 71872 ? in : (in < 71904 ? in-32 : (in < 93792 ? in : (in < 93824 ? in-32 : (in < 125218 ? in : (in < 125252 ? in-34 : (in))))))))))))))))))))))))))))))))))))))))))))))))))))))))))))))))))))))))))))))))))))))))))))))))))))))))))))))))))))))))))))))))))))))))))))))))))))))))))))))))))))))))))))))))))))))))))))))))))))))))))))))))))))))))))))))))))))))))))))))))))))))))))))))))))))))))))))))))))))))))))))))))))))))))))))))))))))))))))))))))))))))))))))))))))))))))));


// Function: unf_matrix_sort
// Synopsis: Sort a 2-dimensional matrix
// Description: Sorts a vector of vectors by the values in one of the columns of the inner vectors. *adapted from quicksort example OpenSCAD manual https://en.wikibooks.org/wiki/OpenSCAD_User_Manual/The_OpenSCAD_Language#Sorting_a_vector*
// Usage: unf_matrix(arr, sort_col_num)
// Arguments:
//   arr = the matrix to sort
//   sort_col_num = the index of the items to sort by in the inner vectors
function unf_matrix_sort(arr, sort_col_num) = !(len(arr)>0) ? [] : let(
  pivot   = arr[floor(len(arr)/2)],
  lesser  = [ for (y = arr) if (y[sort_col_num]  < pivot[sort_col_num]) y ],
  equal   = [ for (y = arr) if (y[sort_col_num] == pivot[sort_col_num]) y ],
  greater = [ for (y = arr) if (y[sort_col_num]  > pivot[sort_col_num]) y ]
) concat(
  unf_matrix_sort(lesser, sort_col_num), equal, unf_matrix_sort(greater, sort_col_num)
);

// Module: unf_enbox
// Synopsis: Place a box around something
// Description: Places a 2-dimensional box around an item without having to know that item's size. This is not strictly a text or list function. However, it is mostly useful for putting a backing behind text since OpenSCAD gives no way to measure the size of rendered text. *Adapted from Mastering OpenSCAD https://mastering-openscad.eu/buch/introduction/*
// Usage unf_enbox(size, extend_to_y, margin) { children() }
// Arguments:
//   size = maximum size to support, must set some limit, may be large.
//   extend_to_y = if the item being boxed begins to the right of the y-axis extend the box all the way to the y-axis. Useful with text because OpenSCAD often adds whitespace to the left of text.
//   margin = margin around enboxed object in mm
module unf_enbox(size=10000, extend_to_y=true, margin=0){
  module one_d(width=true){
    hull(){
      projection(){
	rotate(width ? [0, 90, 0] : [-90, 0, 0]){
	  linear_extrude(size) children([0:$children-1]);
	}
      }
    }
  }
  translate([margin, margin]){
    offset(delta=margin){
      intersection(){
	one_d(true){
	  children([0:$children-1]);
	}
	union(){
	  hull(){
	    if (extend_to_y){ //ensure box goes to y axis b/c text has padding
	      square([0.001, size]);
	    }
	    one_d(false){
	      children([0:$children-1]);
	    }
	  }
	}
      }
    }
  }
}

if ("Demo" == part){
  tv = ["H", "e", "l", "l", "o"];
  echo (str("tv = ",tv));
  ts = unf_vToS(tv);
  echo (str("ts = unf_vToS(tv) = ", ts));
  echo (str("unf_sub(tv, 1, 3) = ", unf_sub(tv, 1, 3)));
  echo (str("unf_sub(ts, 1, 3) = ", unf_sub(ts, 1, 3)));
  echo (str("unf_stToLower(ts) = ", unf_stToLower(ts)));
  echo (str("unf_stToUpper(ts) = ", unf_stToUpper(ts)));
  echo (str("unf_stToNum(\"10\") = ", unf_stToNum("10")));
  echo (str("unf_stToNum(\"12.34\") = ", unf_stToNum("12.34")));
  echo (str("unf_stToNum(\".1234\") = ", unf_stToNum(".1234")));
  echo (str("unf_stToNum(\"0.456\") = ", unf_stToNum("0.456")));
  echo (str("unf_stToNum(\"5/6\") = ", unf_stToNum("5/6")));
  linear_extrude(1){
    unf_enbox(margin=2){
      text("Hello");
    }
  }
  color("red"){
    translate([0, 2, 0]){
      linear_extrude(2){
        text("Hello");
      }
    }
  }
}


/**************************** Source of unf_ordToLower() & unf_ordToUpper() ************************************************

<?php

//https://stackoverflow.com/questions/9361303/can-i-get-the-unicode-value-of-a-character-or-vise-versa-with-php - retrieved 3/7/2022
function _uniord($c) {
    if (ord($c[0]) >=0 && ord($c[0]) <= 127)
        return ord($c[0]);
    if (ord($c[0]) >= 192 && ord($c[0]) <= 223)
        return (ord($c[0])-192)*64 + (ord($c[1])-128);
    if (ord($c[0]) >= 224 && ord($c[0]) <= 239)
        return (ord($c[0])-224)*4096 + (ord($c[1])-128)*64 + (ord($c[2])-128);
    if (ord($c[0]) >= 240 && ord($c[0]) <= 247)
        return (ord($c[0])-240)*262144 + (ord($c[1])-128)*4096 + (ord($c[2])-128)*64 + (ord($c[3])-128);
    if (ord($c[0]) >= 248 && ord($c[0]) <= 251)
        return (ord($c[0])-248)*16777216 + (ord($c[1])-128)*262144 + (ord($c[2])-128)*4096 + (ord($c[3])-128)*64 + (ord($c[4])-128);
    if (ord($c[0]) >= 252 && ord($c[0]) <= 253)
        return (ord($c[0])-252)*1073741824 + (ord($c[1])-128)*16777216 + (ord($c[2])-128)*262144 + (ord($c[3])-128)*4096 + (ord($c[4])-128)*64 + (ord($c[5])-128);
    if (ord($c[0]) >= 254 && ord($c[0]) <= 255)    //  error
        return FALSE;
    return 0;
}   //  function _uniord()


//https://stackoverflow.com/questions/9361303/can-i-get-the-unicode-value-of-a-character-or-vise-versa-with-php - retrieved 3/7/2022
function _unichr($o) {
    if (function_exists('mb_convert_encoding')) {
        return mb_convert_encoding('&#'.intval($o).';', 'UTF-8', 'HTML-ENTITIES');
    } else {
        return chr(intval($o));
    }
}   // function _unichr()
    
$toUpper = false;


$first = 0;
$diff = 0;
$last_diff = 0;
$parens = 0;
$stop = 0xFFFFFFFF;
for ($ord = 0; $ord <= $stop; $ord++){
    $char = _unichr($ord);
    $lower_char = $toUpper ? mb_strToUpper($char) : mb_strToLower($char);
    $lower_ord = _uniord($lower_char);
    $new_diff = $lower_ord - $ord;
    if (0 == $lower_ord || 63 == $lower_ord || 38 == $lower_ord){ //these seem to be junk
        $lower_char = $char;
        $lower_ord = $ord;
        $new_diff = 0;
    }
    if ($ord == $stop || $new_diff != $diff && (!((0==$new_diff&&1==abs($diff)&&0==$last_diff) || (1==abs($new_diff)&&0==$diff&&1==abs($last_diff))))){
        if ($ord < $stop){
            echo "in < {$ord} ? ";
        }
        switch ($diff){
            case 0:
                echo "in";
                break;
            case 1:
                echo "(0 == ((in-{$first})%2) ? in+1 : in)";
                break;
            case -1:
                echo "(0 == ((in-{$first})%2) ? in-1 : in)";
                break;
            default:
                echo 'in'.(0>$diff ? '' : '+').$diff;
                break;
        }
        if ($ord == $stop){
            for ($c = 0; $c < $parens; $c++){
                echo ")";
            }
        } else {
            echo " : (";
            $parens++;
            $first = $ord;
        }
    }
    $last_diff = $diff;
    $diff = $new_diff;
}
    
?> */


// Section: Licensing
//   UnfyOpenSCADLib is free software: you can redistribute it and/or modify it under the terms of the
//   GNU General Public License as published by the Free Software Foundation, either version 3 of
//   the License, or (at your option) any later version.
//   .
//   UnfyOpenSCADLib is distributed in the hope that it will be useful, but WITHOUT ANY WARRANTY;
//   without even the implied warranty of MERCHANTABILITY or FITNESS FOR A PARTICULAR PURPOSE.
//   See the GNU General Public License for more details.
//   .
//   You should have received a copy of the GNU General Public License along with UnfyOpenSCADLib.
//   If not, see <https://www.gnu.org/licenses/>.
